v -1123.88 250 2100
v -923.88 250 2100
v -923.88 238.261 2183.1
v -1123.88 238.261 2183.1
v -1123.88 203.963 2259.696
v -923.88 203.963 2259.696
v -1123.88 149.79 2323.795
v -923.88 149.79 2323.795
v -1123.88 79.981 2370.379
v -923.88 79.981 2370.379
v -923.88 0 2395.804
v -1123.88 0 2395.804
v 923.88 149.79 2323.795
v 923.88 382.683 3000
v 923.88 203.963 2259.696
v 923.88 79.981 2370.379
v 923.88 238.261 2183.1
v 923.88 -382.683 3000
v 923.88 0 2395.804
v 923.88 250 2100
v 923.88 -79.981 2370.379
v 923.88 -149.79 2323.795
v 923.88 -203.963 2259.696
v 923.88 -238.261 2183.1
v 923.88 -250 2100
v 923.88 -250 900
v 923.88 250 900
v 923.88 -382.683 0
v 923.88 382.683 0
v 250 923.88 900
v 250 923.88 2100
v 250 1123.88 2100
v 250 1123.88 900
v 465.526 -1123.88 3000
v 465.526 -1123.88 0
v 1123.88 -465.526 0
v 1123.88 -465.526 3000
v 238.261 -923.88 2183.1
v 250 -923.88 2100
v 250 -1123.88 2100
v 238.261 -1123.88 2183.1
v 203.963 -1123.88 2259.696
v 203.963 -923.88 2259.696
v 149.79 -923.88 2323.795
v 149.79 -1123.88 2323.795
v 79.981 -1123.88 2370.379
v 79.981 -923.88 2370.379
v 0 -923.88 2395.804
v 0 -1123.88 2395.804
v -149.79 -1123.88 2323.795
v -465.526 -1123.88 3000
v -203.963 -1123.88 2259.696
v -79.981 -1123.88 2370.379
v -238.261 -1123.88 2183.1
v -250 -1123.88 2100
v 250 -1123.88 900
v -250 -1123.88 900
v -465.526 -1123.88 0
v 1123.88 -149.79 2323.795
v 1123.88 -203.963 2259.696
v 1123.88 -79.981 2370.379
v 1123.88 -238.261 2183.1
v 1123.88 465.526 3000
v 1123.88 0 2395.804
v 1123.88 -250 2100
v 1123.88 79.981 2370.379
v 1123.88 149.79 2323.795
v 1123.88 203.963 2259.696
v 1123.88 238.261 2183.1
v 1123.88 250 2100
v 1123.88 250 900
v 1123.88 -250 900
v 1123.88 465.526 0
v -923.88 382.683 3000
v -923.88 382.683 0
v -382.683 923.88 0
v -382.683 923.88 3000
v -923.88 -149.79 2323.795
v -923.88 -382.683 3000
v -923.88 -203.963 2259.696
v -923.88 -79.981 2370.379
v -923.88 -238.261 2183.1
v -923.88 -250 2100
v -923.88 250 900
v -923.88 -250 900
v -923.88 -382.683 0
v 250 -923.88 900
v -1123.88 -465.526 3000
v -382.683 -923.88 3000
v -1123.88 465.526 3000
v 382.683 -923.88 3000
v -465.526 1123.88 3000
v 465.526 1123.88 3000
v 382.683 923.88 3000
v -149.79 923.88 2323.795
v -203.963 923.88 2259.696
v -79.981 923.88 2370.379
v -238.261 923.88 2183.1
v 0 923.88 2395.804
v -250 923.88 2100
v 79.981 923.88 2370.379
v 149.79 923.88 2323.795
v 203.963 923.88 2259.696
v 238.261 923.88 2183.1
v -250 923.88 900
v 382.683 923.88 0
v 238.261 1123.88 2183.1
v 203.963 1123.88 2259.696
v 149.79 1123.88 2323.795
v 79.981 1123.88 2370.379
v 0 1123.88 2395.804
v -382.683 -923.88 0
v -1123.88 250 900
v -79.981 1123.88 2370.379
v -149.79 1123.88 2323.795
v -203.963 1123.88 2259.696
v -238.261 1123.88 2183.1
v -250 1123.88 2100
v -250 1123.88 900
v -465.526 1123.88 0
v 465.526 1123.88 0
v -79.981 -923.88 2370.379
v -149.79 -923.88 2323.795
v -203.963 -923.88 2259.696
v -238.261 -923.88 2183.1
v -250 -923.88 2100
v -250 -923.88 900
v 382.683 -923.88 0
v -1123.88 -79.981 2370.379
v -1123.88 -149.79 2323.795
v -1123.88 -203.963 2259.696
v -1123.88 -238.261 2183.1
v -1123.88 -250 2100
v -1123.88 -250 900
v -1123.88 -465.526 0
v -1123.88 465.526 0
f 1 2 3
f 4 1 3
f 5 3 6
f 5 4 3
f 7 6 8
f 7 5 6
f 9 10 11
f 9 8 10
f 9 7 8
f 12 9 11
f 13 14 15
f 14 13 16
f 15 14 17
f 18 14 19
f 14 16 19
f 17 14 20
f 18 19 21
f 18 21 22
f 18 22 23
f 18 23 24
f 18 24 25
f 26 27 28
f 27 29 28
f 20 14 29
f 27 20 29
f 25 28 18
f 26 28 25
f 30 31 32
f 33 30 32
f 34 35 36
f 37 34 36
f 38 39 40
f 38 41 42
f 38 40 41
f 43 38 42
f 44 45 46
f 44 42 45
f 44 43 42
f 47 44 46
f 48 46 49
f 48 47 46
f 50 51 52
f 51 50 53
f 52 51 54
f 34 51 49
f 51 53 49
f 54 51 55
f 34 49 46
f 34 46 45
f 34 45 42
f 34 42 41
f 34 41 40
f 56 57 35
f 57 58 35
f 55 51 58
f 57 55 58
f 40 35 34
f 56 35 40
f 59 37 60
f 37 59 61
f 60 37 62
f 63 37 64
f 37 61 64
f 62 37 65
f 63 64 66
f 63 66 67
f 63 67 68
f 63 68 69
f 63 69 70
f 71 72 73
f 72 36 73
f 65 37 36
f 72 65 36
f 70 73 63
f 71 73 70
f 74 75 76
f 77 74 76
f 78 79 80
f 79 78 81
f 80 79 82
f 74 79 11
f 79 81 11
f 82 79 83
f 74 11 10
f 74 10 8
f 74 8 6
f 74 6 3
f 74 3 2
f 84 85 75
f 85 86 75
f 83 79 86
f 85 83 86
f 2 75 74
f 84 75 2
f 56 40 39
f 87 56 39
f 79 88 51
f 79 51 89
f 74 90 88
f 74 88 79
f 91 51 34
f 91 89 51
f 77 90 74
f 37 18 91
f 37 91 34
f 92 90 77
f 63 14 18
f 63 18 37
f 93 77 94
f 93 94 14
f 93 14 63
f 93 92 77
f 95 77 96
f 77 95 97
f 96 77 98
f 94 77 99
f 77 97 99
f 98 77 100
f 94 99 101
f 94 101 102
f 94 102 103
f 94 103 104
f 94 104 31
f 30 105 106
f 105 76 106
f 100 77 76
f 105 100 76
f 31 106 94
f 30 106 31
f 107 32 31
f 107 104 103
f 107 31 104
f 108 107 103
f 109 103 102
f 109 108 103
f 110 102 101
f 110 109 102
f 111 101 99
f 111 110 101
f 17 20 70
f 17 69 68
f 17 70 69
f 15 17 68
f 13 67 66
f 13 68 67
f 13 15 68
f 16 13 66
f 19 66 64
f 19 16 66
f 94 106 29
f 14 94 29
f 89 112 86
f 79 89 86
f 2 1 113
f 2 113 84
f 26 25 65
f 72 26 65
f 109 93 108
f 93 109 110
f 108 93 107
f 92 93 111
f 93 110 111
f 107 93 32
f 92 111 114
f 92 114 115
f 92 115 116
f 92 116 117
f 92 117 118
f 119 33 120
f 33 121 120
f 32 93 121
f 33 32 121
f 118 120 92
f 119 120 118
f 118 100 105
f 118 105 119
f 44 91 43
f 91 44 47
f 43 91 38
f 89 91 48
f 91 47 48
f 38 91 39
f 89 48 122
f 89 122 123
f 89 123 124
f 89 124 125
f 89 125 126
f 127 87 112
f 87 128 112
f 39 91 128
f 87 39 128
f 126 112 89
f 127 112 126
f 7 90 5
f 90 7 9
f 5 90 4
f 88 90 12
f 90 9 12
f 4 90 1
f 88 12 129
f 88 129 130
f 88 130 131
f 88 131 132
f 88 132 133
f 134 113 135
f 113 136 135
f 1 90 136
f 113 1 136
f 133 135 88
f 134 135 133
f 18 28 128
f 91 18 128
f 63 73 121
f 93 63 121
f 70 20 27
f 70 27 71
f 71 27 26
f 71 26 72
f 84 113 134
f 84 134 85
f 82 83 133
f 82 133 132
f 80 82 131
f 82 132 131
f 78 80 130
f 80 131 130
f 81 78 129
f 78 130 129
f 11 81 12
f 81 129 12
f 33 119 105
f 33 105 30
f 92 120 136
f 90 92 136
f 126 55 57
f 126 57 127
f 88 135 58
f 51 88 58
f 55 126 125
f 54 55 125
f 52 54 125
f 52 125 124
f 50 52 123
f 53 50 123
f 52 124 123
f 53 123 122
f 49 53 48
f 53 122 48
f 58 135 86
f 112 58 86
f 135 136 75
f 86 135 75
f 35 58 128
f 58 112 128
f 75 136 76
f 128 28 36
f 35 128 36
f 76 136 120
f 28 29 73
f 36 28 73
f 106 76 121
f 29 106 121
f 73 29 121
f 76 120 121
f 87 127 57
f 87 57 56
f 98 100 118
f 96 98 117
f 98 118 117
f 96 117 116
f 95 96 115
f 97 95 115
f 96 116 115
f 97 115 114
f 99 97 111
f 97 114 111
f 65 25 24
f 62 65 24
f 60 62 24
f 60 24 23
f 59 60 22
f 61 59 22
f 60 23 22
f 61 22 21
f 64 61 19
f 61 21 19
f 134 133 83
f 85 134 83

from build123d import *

# Parameters (mm, degrees)
F2_DEPTH      = 3000
F4_START      = -600
F3_W          = 600
F3_H          = 500
F4_DEPTH      = 1500
F3_W_2        = 500
F3_H_2        = 600
F5_T1_DEPTH   = 2100
F5_2_T1_DEPTH = 2100
F5_3_T1_DEPTH = 2100
F5_4_T1_DEPTH = 2100


# Not quite as in the source:
# - a fillet or chamfer that OpenCascade refuses, or shapes differently, is made with other operations: its cross-section is extruded or revolved along the edge and cut away or added
# - a feature names something its author has since deleted; it is built from what else it names


with BuildPart() as f2:
    # F1 (on Top) → F2 (new body)
    with BuildSketch(Plane.XY):
        Polygon((1123.8795325113, 465.5261448397), (465.5261448397, 1123.8795325113), (-465.5261448397, 1123.8795325113), (-1123.8795325113, 465.5261448397), (-1123.8795325113, -465.5261448397), (-465.5261448397, -1123.8795325113), (465.5261448397, -1123.8795325113), (1123.8795325113, -465.5261448397), align=None)
        Polygon((-923.8795325113, 382.6834323651), (-382.6834323651, 923.8795325113), (382.6834323651, 923.8795325113), (923.8795325113, 382.6834323651), (923.8795325113, -382.6834323651), (382.6834323651, -923.8795325113), (-382.6834323651, -923.8795325113), (-923.8795325113, -382.6834323651), align=None, mode=Mode.SUBTRACT)
    extrude(amount=F2_DEPTH)


with BuildPart() as f4:
    # F3 (on face) → F4 (new body)
    with BuildSketch(Plane.XY.offset(3000).offset(F4_START)):
        with Locations((1100, 0)):
            Rectangle(F3_W, F3_H)
    extrude(amount=-F4_DEPTH)

    # F5#4: fillet of radius 300 on 2 edges, made by hand

    # F5_4_s2 → F5_4_t1 (cut)
    with BuildSketch(Plane.YZ.offset(50)):
        with BuildLine():
            ThreePointArc((-250, 2100), (-162.132034356, 2312.132034356), (50, 2400))
            Line((50, 2400), (-250, 2400))
            Line((-250, 2400), (-250, 2100))
        make_face()
        with BuildLine():
            ThreePointArc((250, 2100), (162.132034356, 2312.132034356), (-50, 2400))
            Line((-50, 2400), (250, 2400))
            Line((250, 2400), (250, 2100))
        make_face()
    extrude(amount=F5_4_T1_DEPTH, mode=Mode.SUBTRACT)


with BuildPart() as f4b:
    # F3 (on face) → F4, piece 2 (new body)
    with BuildSketch(Plane.XY.offset(3000).offset(F4_START)):
        with Locations((0, 1100)):
            Rectangle(F3_W_2, F3_H_2)
    extrude(amount=-F4_DEPTH)

    # F5: fillet of radius 300 on 2 edges, made by hand

    # F5_s2 → F5_t1 (cut)
    with BuildSketch(Plane.XZ.offset(-2150)):
        with BuildLine():
            ThreePointArc((-250, 2100), (-162.132034356, 2312.132034356), (50, 2400))
            Line((50, 2400), (-250, 2400))
            Line((-250, 2400), (-250, 2100))
        make_face()
        with BuildLine():
            ThreePointArc((250, 2100), (162.132034356, 2312.132034356), (-50, 2400))
            Line((-50, 2400), (250, 2400))
            Line((250, 2400), (250, 2100))
        make_face()
    extrude(amount=F5_T1_DEPTH, mode=Mode.SUBTRACT)


with BuildPart() as f4c:
    # F3 (on face) → F4, piece 3 (new body)
    with BuildSketch(Plane.XY.offset(3000).offset(F4_START)):
        with Locations((-1100, 0)):
            Rectangle(F3_W, F3_H)
    extrude(amount=-F4_DEPTH)

    # F5#2: fillet of radius 300 on 2 edges, made by hand

    # F5_2_s2 → F5_2_t1 (cut)
    with BuildSketch(Plane.YZ.offset(-2150)):
        with BuildLine():
            ThreePointArc((250, 2100), (162.132034356, 2312.132034356), (-50, 2400))
            Line((-50, 2400), (250, 2400))
            Line((250, 2400), (250, 2100))
        make_face()
        with BuildLine():
            ThreePointArc((-250, 2100), (-162.132034356, 2312.132034356), (50, 2400))
            Line((50, 2400), (-250, 2400))
            Line((-250, 2400), (-250, 2100))
        make_face()
    extrude(amount=F5_2_T1_DEPTH, mode=Mode.SUBTRACT)


with BuildPart() as f4d:
    # F3 (on face) → F4, piece 4 (new body)
    with BuildSketch(Plane.XY.offset(3000).offset(F4_START)):
        with Locations((0, -1100)):
            Rectangle(F3_W_2, F3_H_2)
    extrude(amount=-F4_DEPTH)

    # F5#3: fillet of radius 300 on 2 edges, made by hand

    # F5_3_s2 → F5_3_t1 (cut)
    with BuildSketch(Plane.XZ.offset(50)):
        with BuildLine():
            ThreePointArc((-250, 2100), (-162.132034356, 2312.132034356), (50, 2400))
            Line((50, 2400), (-250, 2400))
            Line((-250, 2400), (-250, 2100))
        make_face()
        with BuildLine():
            ThreePointArc((250, 2100), (162.132034356, 2312.132034356), (-50, 2400))
            Line((-50, 2400), (250, 2400))
            Line((250, 2400), (250, 2100))
        make_face()
    extrude(amount=F5_3_T1_DEPTH, mode=Mode.SUBTRACT)


with BuildPart() as f2_1:
    add(f2.part)

    # F6: cut F4, F4b, F4c, F4d
    add(f4.part, mode=Mode.SUBTRACT)
    add(f4b.part, mode=Mode.SUBTRACT)
    add(f4c.part, mode=Mode.SUBTRACT)
    add(f4d.part, mode=Mode.SUBTRACT)


solid = f2_1.part
